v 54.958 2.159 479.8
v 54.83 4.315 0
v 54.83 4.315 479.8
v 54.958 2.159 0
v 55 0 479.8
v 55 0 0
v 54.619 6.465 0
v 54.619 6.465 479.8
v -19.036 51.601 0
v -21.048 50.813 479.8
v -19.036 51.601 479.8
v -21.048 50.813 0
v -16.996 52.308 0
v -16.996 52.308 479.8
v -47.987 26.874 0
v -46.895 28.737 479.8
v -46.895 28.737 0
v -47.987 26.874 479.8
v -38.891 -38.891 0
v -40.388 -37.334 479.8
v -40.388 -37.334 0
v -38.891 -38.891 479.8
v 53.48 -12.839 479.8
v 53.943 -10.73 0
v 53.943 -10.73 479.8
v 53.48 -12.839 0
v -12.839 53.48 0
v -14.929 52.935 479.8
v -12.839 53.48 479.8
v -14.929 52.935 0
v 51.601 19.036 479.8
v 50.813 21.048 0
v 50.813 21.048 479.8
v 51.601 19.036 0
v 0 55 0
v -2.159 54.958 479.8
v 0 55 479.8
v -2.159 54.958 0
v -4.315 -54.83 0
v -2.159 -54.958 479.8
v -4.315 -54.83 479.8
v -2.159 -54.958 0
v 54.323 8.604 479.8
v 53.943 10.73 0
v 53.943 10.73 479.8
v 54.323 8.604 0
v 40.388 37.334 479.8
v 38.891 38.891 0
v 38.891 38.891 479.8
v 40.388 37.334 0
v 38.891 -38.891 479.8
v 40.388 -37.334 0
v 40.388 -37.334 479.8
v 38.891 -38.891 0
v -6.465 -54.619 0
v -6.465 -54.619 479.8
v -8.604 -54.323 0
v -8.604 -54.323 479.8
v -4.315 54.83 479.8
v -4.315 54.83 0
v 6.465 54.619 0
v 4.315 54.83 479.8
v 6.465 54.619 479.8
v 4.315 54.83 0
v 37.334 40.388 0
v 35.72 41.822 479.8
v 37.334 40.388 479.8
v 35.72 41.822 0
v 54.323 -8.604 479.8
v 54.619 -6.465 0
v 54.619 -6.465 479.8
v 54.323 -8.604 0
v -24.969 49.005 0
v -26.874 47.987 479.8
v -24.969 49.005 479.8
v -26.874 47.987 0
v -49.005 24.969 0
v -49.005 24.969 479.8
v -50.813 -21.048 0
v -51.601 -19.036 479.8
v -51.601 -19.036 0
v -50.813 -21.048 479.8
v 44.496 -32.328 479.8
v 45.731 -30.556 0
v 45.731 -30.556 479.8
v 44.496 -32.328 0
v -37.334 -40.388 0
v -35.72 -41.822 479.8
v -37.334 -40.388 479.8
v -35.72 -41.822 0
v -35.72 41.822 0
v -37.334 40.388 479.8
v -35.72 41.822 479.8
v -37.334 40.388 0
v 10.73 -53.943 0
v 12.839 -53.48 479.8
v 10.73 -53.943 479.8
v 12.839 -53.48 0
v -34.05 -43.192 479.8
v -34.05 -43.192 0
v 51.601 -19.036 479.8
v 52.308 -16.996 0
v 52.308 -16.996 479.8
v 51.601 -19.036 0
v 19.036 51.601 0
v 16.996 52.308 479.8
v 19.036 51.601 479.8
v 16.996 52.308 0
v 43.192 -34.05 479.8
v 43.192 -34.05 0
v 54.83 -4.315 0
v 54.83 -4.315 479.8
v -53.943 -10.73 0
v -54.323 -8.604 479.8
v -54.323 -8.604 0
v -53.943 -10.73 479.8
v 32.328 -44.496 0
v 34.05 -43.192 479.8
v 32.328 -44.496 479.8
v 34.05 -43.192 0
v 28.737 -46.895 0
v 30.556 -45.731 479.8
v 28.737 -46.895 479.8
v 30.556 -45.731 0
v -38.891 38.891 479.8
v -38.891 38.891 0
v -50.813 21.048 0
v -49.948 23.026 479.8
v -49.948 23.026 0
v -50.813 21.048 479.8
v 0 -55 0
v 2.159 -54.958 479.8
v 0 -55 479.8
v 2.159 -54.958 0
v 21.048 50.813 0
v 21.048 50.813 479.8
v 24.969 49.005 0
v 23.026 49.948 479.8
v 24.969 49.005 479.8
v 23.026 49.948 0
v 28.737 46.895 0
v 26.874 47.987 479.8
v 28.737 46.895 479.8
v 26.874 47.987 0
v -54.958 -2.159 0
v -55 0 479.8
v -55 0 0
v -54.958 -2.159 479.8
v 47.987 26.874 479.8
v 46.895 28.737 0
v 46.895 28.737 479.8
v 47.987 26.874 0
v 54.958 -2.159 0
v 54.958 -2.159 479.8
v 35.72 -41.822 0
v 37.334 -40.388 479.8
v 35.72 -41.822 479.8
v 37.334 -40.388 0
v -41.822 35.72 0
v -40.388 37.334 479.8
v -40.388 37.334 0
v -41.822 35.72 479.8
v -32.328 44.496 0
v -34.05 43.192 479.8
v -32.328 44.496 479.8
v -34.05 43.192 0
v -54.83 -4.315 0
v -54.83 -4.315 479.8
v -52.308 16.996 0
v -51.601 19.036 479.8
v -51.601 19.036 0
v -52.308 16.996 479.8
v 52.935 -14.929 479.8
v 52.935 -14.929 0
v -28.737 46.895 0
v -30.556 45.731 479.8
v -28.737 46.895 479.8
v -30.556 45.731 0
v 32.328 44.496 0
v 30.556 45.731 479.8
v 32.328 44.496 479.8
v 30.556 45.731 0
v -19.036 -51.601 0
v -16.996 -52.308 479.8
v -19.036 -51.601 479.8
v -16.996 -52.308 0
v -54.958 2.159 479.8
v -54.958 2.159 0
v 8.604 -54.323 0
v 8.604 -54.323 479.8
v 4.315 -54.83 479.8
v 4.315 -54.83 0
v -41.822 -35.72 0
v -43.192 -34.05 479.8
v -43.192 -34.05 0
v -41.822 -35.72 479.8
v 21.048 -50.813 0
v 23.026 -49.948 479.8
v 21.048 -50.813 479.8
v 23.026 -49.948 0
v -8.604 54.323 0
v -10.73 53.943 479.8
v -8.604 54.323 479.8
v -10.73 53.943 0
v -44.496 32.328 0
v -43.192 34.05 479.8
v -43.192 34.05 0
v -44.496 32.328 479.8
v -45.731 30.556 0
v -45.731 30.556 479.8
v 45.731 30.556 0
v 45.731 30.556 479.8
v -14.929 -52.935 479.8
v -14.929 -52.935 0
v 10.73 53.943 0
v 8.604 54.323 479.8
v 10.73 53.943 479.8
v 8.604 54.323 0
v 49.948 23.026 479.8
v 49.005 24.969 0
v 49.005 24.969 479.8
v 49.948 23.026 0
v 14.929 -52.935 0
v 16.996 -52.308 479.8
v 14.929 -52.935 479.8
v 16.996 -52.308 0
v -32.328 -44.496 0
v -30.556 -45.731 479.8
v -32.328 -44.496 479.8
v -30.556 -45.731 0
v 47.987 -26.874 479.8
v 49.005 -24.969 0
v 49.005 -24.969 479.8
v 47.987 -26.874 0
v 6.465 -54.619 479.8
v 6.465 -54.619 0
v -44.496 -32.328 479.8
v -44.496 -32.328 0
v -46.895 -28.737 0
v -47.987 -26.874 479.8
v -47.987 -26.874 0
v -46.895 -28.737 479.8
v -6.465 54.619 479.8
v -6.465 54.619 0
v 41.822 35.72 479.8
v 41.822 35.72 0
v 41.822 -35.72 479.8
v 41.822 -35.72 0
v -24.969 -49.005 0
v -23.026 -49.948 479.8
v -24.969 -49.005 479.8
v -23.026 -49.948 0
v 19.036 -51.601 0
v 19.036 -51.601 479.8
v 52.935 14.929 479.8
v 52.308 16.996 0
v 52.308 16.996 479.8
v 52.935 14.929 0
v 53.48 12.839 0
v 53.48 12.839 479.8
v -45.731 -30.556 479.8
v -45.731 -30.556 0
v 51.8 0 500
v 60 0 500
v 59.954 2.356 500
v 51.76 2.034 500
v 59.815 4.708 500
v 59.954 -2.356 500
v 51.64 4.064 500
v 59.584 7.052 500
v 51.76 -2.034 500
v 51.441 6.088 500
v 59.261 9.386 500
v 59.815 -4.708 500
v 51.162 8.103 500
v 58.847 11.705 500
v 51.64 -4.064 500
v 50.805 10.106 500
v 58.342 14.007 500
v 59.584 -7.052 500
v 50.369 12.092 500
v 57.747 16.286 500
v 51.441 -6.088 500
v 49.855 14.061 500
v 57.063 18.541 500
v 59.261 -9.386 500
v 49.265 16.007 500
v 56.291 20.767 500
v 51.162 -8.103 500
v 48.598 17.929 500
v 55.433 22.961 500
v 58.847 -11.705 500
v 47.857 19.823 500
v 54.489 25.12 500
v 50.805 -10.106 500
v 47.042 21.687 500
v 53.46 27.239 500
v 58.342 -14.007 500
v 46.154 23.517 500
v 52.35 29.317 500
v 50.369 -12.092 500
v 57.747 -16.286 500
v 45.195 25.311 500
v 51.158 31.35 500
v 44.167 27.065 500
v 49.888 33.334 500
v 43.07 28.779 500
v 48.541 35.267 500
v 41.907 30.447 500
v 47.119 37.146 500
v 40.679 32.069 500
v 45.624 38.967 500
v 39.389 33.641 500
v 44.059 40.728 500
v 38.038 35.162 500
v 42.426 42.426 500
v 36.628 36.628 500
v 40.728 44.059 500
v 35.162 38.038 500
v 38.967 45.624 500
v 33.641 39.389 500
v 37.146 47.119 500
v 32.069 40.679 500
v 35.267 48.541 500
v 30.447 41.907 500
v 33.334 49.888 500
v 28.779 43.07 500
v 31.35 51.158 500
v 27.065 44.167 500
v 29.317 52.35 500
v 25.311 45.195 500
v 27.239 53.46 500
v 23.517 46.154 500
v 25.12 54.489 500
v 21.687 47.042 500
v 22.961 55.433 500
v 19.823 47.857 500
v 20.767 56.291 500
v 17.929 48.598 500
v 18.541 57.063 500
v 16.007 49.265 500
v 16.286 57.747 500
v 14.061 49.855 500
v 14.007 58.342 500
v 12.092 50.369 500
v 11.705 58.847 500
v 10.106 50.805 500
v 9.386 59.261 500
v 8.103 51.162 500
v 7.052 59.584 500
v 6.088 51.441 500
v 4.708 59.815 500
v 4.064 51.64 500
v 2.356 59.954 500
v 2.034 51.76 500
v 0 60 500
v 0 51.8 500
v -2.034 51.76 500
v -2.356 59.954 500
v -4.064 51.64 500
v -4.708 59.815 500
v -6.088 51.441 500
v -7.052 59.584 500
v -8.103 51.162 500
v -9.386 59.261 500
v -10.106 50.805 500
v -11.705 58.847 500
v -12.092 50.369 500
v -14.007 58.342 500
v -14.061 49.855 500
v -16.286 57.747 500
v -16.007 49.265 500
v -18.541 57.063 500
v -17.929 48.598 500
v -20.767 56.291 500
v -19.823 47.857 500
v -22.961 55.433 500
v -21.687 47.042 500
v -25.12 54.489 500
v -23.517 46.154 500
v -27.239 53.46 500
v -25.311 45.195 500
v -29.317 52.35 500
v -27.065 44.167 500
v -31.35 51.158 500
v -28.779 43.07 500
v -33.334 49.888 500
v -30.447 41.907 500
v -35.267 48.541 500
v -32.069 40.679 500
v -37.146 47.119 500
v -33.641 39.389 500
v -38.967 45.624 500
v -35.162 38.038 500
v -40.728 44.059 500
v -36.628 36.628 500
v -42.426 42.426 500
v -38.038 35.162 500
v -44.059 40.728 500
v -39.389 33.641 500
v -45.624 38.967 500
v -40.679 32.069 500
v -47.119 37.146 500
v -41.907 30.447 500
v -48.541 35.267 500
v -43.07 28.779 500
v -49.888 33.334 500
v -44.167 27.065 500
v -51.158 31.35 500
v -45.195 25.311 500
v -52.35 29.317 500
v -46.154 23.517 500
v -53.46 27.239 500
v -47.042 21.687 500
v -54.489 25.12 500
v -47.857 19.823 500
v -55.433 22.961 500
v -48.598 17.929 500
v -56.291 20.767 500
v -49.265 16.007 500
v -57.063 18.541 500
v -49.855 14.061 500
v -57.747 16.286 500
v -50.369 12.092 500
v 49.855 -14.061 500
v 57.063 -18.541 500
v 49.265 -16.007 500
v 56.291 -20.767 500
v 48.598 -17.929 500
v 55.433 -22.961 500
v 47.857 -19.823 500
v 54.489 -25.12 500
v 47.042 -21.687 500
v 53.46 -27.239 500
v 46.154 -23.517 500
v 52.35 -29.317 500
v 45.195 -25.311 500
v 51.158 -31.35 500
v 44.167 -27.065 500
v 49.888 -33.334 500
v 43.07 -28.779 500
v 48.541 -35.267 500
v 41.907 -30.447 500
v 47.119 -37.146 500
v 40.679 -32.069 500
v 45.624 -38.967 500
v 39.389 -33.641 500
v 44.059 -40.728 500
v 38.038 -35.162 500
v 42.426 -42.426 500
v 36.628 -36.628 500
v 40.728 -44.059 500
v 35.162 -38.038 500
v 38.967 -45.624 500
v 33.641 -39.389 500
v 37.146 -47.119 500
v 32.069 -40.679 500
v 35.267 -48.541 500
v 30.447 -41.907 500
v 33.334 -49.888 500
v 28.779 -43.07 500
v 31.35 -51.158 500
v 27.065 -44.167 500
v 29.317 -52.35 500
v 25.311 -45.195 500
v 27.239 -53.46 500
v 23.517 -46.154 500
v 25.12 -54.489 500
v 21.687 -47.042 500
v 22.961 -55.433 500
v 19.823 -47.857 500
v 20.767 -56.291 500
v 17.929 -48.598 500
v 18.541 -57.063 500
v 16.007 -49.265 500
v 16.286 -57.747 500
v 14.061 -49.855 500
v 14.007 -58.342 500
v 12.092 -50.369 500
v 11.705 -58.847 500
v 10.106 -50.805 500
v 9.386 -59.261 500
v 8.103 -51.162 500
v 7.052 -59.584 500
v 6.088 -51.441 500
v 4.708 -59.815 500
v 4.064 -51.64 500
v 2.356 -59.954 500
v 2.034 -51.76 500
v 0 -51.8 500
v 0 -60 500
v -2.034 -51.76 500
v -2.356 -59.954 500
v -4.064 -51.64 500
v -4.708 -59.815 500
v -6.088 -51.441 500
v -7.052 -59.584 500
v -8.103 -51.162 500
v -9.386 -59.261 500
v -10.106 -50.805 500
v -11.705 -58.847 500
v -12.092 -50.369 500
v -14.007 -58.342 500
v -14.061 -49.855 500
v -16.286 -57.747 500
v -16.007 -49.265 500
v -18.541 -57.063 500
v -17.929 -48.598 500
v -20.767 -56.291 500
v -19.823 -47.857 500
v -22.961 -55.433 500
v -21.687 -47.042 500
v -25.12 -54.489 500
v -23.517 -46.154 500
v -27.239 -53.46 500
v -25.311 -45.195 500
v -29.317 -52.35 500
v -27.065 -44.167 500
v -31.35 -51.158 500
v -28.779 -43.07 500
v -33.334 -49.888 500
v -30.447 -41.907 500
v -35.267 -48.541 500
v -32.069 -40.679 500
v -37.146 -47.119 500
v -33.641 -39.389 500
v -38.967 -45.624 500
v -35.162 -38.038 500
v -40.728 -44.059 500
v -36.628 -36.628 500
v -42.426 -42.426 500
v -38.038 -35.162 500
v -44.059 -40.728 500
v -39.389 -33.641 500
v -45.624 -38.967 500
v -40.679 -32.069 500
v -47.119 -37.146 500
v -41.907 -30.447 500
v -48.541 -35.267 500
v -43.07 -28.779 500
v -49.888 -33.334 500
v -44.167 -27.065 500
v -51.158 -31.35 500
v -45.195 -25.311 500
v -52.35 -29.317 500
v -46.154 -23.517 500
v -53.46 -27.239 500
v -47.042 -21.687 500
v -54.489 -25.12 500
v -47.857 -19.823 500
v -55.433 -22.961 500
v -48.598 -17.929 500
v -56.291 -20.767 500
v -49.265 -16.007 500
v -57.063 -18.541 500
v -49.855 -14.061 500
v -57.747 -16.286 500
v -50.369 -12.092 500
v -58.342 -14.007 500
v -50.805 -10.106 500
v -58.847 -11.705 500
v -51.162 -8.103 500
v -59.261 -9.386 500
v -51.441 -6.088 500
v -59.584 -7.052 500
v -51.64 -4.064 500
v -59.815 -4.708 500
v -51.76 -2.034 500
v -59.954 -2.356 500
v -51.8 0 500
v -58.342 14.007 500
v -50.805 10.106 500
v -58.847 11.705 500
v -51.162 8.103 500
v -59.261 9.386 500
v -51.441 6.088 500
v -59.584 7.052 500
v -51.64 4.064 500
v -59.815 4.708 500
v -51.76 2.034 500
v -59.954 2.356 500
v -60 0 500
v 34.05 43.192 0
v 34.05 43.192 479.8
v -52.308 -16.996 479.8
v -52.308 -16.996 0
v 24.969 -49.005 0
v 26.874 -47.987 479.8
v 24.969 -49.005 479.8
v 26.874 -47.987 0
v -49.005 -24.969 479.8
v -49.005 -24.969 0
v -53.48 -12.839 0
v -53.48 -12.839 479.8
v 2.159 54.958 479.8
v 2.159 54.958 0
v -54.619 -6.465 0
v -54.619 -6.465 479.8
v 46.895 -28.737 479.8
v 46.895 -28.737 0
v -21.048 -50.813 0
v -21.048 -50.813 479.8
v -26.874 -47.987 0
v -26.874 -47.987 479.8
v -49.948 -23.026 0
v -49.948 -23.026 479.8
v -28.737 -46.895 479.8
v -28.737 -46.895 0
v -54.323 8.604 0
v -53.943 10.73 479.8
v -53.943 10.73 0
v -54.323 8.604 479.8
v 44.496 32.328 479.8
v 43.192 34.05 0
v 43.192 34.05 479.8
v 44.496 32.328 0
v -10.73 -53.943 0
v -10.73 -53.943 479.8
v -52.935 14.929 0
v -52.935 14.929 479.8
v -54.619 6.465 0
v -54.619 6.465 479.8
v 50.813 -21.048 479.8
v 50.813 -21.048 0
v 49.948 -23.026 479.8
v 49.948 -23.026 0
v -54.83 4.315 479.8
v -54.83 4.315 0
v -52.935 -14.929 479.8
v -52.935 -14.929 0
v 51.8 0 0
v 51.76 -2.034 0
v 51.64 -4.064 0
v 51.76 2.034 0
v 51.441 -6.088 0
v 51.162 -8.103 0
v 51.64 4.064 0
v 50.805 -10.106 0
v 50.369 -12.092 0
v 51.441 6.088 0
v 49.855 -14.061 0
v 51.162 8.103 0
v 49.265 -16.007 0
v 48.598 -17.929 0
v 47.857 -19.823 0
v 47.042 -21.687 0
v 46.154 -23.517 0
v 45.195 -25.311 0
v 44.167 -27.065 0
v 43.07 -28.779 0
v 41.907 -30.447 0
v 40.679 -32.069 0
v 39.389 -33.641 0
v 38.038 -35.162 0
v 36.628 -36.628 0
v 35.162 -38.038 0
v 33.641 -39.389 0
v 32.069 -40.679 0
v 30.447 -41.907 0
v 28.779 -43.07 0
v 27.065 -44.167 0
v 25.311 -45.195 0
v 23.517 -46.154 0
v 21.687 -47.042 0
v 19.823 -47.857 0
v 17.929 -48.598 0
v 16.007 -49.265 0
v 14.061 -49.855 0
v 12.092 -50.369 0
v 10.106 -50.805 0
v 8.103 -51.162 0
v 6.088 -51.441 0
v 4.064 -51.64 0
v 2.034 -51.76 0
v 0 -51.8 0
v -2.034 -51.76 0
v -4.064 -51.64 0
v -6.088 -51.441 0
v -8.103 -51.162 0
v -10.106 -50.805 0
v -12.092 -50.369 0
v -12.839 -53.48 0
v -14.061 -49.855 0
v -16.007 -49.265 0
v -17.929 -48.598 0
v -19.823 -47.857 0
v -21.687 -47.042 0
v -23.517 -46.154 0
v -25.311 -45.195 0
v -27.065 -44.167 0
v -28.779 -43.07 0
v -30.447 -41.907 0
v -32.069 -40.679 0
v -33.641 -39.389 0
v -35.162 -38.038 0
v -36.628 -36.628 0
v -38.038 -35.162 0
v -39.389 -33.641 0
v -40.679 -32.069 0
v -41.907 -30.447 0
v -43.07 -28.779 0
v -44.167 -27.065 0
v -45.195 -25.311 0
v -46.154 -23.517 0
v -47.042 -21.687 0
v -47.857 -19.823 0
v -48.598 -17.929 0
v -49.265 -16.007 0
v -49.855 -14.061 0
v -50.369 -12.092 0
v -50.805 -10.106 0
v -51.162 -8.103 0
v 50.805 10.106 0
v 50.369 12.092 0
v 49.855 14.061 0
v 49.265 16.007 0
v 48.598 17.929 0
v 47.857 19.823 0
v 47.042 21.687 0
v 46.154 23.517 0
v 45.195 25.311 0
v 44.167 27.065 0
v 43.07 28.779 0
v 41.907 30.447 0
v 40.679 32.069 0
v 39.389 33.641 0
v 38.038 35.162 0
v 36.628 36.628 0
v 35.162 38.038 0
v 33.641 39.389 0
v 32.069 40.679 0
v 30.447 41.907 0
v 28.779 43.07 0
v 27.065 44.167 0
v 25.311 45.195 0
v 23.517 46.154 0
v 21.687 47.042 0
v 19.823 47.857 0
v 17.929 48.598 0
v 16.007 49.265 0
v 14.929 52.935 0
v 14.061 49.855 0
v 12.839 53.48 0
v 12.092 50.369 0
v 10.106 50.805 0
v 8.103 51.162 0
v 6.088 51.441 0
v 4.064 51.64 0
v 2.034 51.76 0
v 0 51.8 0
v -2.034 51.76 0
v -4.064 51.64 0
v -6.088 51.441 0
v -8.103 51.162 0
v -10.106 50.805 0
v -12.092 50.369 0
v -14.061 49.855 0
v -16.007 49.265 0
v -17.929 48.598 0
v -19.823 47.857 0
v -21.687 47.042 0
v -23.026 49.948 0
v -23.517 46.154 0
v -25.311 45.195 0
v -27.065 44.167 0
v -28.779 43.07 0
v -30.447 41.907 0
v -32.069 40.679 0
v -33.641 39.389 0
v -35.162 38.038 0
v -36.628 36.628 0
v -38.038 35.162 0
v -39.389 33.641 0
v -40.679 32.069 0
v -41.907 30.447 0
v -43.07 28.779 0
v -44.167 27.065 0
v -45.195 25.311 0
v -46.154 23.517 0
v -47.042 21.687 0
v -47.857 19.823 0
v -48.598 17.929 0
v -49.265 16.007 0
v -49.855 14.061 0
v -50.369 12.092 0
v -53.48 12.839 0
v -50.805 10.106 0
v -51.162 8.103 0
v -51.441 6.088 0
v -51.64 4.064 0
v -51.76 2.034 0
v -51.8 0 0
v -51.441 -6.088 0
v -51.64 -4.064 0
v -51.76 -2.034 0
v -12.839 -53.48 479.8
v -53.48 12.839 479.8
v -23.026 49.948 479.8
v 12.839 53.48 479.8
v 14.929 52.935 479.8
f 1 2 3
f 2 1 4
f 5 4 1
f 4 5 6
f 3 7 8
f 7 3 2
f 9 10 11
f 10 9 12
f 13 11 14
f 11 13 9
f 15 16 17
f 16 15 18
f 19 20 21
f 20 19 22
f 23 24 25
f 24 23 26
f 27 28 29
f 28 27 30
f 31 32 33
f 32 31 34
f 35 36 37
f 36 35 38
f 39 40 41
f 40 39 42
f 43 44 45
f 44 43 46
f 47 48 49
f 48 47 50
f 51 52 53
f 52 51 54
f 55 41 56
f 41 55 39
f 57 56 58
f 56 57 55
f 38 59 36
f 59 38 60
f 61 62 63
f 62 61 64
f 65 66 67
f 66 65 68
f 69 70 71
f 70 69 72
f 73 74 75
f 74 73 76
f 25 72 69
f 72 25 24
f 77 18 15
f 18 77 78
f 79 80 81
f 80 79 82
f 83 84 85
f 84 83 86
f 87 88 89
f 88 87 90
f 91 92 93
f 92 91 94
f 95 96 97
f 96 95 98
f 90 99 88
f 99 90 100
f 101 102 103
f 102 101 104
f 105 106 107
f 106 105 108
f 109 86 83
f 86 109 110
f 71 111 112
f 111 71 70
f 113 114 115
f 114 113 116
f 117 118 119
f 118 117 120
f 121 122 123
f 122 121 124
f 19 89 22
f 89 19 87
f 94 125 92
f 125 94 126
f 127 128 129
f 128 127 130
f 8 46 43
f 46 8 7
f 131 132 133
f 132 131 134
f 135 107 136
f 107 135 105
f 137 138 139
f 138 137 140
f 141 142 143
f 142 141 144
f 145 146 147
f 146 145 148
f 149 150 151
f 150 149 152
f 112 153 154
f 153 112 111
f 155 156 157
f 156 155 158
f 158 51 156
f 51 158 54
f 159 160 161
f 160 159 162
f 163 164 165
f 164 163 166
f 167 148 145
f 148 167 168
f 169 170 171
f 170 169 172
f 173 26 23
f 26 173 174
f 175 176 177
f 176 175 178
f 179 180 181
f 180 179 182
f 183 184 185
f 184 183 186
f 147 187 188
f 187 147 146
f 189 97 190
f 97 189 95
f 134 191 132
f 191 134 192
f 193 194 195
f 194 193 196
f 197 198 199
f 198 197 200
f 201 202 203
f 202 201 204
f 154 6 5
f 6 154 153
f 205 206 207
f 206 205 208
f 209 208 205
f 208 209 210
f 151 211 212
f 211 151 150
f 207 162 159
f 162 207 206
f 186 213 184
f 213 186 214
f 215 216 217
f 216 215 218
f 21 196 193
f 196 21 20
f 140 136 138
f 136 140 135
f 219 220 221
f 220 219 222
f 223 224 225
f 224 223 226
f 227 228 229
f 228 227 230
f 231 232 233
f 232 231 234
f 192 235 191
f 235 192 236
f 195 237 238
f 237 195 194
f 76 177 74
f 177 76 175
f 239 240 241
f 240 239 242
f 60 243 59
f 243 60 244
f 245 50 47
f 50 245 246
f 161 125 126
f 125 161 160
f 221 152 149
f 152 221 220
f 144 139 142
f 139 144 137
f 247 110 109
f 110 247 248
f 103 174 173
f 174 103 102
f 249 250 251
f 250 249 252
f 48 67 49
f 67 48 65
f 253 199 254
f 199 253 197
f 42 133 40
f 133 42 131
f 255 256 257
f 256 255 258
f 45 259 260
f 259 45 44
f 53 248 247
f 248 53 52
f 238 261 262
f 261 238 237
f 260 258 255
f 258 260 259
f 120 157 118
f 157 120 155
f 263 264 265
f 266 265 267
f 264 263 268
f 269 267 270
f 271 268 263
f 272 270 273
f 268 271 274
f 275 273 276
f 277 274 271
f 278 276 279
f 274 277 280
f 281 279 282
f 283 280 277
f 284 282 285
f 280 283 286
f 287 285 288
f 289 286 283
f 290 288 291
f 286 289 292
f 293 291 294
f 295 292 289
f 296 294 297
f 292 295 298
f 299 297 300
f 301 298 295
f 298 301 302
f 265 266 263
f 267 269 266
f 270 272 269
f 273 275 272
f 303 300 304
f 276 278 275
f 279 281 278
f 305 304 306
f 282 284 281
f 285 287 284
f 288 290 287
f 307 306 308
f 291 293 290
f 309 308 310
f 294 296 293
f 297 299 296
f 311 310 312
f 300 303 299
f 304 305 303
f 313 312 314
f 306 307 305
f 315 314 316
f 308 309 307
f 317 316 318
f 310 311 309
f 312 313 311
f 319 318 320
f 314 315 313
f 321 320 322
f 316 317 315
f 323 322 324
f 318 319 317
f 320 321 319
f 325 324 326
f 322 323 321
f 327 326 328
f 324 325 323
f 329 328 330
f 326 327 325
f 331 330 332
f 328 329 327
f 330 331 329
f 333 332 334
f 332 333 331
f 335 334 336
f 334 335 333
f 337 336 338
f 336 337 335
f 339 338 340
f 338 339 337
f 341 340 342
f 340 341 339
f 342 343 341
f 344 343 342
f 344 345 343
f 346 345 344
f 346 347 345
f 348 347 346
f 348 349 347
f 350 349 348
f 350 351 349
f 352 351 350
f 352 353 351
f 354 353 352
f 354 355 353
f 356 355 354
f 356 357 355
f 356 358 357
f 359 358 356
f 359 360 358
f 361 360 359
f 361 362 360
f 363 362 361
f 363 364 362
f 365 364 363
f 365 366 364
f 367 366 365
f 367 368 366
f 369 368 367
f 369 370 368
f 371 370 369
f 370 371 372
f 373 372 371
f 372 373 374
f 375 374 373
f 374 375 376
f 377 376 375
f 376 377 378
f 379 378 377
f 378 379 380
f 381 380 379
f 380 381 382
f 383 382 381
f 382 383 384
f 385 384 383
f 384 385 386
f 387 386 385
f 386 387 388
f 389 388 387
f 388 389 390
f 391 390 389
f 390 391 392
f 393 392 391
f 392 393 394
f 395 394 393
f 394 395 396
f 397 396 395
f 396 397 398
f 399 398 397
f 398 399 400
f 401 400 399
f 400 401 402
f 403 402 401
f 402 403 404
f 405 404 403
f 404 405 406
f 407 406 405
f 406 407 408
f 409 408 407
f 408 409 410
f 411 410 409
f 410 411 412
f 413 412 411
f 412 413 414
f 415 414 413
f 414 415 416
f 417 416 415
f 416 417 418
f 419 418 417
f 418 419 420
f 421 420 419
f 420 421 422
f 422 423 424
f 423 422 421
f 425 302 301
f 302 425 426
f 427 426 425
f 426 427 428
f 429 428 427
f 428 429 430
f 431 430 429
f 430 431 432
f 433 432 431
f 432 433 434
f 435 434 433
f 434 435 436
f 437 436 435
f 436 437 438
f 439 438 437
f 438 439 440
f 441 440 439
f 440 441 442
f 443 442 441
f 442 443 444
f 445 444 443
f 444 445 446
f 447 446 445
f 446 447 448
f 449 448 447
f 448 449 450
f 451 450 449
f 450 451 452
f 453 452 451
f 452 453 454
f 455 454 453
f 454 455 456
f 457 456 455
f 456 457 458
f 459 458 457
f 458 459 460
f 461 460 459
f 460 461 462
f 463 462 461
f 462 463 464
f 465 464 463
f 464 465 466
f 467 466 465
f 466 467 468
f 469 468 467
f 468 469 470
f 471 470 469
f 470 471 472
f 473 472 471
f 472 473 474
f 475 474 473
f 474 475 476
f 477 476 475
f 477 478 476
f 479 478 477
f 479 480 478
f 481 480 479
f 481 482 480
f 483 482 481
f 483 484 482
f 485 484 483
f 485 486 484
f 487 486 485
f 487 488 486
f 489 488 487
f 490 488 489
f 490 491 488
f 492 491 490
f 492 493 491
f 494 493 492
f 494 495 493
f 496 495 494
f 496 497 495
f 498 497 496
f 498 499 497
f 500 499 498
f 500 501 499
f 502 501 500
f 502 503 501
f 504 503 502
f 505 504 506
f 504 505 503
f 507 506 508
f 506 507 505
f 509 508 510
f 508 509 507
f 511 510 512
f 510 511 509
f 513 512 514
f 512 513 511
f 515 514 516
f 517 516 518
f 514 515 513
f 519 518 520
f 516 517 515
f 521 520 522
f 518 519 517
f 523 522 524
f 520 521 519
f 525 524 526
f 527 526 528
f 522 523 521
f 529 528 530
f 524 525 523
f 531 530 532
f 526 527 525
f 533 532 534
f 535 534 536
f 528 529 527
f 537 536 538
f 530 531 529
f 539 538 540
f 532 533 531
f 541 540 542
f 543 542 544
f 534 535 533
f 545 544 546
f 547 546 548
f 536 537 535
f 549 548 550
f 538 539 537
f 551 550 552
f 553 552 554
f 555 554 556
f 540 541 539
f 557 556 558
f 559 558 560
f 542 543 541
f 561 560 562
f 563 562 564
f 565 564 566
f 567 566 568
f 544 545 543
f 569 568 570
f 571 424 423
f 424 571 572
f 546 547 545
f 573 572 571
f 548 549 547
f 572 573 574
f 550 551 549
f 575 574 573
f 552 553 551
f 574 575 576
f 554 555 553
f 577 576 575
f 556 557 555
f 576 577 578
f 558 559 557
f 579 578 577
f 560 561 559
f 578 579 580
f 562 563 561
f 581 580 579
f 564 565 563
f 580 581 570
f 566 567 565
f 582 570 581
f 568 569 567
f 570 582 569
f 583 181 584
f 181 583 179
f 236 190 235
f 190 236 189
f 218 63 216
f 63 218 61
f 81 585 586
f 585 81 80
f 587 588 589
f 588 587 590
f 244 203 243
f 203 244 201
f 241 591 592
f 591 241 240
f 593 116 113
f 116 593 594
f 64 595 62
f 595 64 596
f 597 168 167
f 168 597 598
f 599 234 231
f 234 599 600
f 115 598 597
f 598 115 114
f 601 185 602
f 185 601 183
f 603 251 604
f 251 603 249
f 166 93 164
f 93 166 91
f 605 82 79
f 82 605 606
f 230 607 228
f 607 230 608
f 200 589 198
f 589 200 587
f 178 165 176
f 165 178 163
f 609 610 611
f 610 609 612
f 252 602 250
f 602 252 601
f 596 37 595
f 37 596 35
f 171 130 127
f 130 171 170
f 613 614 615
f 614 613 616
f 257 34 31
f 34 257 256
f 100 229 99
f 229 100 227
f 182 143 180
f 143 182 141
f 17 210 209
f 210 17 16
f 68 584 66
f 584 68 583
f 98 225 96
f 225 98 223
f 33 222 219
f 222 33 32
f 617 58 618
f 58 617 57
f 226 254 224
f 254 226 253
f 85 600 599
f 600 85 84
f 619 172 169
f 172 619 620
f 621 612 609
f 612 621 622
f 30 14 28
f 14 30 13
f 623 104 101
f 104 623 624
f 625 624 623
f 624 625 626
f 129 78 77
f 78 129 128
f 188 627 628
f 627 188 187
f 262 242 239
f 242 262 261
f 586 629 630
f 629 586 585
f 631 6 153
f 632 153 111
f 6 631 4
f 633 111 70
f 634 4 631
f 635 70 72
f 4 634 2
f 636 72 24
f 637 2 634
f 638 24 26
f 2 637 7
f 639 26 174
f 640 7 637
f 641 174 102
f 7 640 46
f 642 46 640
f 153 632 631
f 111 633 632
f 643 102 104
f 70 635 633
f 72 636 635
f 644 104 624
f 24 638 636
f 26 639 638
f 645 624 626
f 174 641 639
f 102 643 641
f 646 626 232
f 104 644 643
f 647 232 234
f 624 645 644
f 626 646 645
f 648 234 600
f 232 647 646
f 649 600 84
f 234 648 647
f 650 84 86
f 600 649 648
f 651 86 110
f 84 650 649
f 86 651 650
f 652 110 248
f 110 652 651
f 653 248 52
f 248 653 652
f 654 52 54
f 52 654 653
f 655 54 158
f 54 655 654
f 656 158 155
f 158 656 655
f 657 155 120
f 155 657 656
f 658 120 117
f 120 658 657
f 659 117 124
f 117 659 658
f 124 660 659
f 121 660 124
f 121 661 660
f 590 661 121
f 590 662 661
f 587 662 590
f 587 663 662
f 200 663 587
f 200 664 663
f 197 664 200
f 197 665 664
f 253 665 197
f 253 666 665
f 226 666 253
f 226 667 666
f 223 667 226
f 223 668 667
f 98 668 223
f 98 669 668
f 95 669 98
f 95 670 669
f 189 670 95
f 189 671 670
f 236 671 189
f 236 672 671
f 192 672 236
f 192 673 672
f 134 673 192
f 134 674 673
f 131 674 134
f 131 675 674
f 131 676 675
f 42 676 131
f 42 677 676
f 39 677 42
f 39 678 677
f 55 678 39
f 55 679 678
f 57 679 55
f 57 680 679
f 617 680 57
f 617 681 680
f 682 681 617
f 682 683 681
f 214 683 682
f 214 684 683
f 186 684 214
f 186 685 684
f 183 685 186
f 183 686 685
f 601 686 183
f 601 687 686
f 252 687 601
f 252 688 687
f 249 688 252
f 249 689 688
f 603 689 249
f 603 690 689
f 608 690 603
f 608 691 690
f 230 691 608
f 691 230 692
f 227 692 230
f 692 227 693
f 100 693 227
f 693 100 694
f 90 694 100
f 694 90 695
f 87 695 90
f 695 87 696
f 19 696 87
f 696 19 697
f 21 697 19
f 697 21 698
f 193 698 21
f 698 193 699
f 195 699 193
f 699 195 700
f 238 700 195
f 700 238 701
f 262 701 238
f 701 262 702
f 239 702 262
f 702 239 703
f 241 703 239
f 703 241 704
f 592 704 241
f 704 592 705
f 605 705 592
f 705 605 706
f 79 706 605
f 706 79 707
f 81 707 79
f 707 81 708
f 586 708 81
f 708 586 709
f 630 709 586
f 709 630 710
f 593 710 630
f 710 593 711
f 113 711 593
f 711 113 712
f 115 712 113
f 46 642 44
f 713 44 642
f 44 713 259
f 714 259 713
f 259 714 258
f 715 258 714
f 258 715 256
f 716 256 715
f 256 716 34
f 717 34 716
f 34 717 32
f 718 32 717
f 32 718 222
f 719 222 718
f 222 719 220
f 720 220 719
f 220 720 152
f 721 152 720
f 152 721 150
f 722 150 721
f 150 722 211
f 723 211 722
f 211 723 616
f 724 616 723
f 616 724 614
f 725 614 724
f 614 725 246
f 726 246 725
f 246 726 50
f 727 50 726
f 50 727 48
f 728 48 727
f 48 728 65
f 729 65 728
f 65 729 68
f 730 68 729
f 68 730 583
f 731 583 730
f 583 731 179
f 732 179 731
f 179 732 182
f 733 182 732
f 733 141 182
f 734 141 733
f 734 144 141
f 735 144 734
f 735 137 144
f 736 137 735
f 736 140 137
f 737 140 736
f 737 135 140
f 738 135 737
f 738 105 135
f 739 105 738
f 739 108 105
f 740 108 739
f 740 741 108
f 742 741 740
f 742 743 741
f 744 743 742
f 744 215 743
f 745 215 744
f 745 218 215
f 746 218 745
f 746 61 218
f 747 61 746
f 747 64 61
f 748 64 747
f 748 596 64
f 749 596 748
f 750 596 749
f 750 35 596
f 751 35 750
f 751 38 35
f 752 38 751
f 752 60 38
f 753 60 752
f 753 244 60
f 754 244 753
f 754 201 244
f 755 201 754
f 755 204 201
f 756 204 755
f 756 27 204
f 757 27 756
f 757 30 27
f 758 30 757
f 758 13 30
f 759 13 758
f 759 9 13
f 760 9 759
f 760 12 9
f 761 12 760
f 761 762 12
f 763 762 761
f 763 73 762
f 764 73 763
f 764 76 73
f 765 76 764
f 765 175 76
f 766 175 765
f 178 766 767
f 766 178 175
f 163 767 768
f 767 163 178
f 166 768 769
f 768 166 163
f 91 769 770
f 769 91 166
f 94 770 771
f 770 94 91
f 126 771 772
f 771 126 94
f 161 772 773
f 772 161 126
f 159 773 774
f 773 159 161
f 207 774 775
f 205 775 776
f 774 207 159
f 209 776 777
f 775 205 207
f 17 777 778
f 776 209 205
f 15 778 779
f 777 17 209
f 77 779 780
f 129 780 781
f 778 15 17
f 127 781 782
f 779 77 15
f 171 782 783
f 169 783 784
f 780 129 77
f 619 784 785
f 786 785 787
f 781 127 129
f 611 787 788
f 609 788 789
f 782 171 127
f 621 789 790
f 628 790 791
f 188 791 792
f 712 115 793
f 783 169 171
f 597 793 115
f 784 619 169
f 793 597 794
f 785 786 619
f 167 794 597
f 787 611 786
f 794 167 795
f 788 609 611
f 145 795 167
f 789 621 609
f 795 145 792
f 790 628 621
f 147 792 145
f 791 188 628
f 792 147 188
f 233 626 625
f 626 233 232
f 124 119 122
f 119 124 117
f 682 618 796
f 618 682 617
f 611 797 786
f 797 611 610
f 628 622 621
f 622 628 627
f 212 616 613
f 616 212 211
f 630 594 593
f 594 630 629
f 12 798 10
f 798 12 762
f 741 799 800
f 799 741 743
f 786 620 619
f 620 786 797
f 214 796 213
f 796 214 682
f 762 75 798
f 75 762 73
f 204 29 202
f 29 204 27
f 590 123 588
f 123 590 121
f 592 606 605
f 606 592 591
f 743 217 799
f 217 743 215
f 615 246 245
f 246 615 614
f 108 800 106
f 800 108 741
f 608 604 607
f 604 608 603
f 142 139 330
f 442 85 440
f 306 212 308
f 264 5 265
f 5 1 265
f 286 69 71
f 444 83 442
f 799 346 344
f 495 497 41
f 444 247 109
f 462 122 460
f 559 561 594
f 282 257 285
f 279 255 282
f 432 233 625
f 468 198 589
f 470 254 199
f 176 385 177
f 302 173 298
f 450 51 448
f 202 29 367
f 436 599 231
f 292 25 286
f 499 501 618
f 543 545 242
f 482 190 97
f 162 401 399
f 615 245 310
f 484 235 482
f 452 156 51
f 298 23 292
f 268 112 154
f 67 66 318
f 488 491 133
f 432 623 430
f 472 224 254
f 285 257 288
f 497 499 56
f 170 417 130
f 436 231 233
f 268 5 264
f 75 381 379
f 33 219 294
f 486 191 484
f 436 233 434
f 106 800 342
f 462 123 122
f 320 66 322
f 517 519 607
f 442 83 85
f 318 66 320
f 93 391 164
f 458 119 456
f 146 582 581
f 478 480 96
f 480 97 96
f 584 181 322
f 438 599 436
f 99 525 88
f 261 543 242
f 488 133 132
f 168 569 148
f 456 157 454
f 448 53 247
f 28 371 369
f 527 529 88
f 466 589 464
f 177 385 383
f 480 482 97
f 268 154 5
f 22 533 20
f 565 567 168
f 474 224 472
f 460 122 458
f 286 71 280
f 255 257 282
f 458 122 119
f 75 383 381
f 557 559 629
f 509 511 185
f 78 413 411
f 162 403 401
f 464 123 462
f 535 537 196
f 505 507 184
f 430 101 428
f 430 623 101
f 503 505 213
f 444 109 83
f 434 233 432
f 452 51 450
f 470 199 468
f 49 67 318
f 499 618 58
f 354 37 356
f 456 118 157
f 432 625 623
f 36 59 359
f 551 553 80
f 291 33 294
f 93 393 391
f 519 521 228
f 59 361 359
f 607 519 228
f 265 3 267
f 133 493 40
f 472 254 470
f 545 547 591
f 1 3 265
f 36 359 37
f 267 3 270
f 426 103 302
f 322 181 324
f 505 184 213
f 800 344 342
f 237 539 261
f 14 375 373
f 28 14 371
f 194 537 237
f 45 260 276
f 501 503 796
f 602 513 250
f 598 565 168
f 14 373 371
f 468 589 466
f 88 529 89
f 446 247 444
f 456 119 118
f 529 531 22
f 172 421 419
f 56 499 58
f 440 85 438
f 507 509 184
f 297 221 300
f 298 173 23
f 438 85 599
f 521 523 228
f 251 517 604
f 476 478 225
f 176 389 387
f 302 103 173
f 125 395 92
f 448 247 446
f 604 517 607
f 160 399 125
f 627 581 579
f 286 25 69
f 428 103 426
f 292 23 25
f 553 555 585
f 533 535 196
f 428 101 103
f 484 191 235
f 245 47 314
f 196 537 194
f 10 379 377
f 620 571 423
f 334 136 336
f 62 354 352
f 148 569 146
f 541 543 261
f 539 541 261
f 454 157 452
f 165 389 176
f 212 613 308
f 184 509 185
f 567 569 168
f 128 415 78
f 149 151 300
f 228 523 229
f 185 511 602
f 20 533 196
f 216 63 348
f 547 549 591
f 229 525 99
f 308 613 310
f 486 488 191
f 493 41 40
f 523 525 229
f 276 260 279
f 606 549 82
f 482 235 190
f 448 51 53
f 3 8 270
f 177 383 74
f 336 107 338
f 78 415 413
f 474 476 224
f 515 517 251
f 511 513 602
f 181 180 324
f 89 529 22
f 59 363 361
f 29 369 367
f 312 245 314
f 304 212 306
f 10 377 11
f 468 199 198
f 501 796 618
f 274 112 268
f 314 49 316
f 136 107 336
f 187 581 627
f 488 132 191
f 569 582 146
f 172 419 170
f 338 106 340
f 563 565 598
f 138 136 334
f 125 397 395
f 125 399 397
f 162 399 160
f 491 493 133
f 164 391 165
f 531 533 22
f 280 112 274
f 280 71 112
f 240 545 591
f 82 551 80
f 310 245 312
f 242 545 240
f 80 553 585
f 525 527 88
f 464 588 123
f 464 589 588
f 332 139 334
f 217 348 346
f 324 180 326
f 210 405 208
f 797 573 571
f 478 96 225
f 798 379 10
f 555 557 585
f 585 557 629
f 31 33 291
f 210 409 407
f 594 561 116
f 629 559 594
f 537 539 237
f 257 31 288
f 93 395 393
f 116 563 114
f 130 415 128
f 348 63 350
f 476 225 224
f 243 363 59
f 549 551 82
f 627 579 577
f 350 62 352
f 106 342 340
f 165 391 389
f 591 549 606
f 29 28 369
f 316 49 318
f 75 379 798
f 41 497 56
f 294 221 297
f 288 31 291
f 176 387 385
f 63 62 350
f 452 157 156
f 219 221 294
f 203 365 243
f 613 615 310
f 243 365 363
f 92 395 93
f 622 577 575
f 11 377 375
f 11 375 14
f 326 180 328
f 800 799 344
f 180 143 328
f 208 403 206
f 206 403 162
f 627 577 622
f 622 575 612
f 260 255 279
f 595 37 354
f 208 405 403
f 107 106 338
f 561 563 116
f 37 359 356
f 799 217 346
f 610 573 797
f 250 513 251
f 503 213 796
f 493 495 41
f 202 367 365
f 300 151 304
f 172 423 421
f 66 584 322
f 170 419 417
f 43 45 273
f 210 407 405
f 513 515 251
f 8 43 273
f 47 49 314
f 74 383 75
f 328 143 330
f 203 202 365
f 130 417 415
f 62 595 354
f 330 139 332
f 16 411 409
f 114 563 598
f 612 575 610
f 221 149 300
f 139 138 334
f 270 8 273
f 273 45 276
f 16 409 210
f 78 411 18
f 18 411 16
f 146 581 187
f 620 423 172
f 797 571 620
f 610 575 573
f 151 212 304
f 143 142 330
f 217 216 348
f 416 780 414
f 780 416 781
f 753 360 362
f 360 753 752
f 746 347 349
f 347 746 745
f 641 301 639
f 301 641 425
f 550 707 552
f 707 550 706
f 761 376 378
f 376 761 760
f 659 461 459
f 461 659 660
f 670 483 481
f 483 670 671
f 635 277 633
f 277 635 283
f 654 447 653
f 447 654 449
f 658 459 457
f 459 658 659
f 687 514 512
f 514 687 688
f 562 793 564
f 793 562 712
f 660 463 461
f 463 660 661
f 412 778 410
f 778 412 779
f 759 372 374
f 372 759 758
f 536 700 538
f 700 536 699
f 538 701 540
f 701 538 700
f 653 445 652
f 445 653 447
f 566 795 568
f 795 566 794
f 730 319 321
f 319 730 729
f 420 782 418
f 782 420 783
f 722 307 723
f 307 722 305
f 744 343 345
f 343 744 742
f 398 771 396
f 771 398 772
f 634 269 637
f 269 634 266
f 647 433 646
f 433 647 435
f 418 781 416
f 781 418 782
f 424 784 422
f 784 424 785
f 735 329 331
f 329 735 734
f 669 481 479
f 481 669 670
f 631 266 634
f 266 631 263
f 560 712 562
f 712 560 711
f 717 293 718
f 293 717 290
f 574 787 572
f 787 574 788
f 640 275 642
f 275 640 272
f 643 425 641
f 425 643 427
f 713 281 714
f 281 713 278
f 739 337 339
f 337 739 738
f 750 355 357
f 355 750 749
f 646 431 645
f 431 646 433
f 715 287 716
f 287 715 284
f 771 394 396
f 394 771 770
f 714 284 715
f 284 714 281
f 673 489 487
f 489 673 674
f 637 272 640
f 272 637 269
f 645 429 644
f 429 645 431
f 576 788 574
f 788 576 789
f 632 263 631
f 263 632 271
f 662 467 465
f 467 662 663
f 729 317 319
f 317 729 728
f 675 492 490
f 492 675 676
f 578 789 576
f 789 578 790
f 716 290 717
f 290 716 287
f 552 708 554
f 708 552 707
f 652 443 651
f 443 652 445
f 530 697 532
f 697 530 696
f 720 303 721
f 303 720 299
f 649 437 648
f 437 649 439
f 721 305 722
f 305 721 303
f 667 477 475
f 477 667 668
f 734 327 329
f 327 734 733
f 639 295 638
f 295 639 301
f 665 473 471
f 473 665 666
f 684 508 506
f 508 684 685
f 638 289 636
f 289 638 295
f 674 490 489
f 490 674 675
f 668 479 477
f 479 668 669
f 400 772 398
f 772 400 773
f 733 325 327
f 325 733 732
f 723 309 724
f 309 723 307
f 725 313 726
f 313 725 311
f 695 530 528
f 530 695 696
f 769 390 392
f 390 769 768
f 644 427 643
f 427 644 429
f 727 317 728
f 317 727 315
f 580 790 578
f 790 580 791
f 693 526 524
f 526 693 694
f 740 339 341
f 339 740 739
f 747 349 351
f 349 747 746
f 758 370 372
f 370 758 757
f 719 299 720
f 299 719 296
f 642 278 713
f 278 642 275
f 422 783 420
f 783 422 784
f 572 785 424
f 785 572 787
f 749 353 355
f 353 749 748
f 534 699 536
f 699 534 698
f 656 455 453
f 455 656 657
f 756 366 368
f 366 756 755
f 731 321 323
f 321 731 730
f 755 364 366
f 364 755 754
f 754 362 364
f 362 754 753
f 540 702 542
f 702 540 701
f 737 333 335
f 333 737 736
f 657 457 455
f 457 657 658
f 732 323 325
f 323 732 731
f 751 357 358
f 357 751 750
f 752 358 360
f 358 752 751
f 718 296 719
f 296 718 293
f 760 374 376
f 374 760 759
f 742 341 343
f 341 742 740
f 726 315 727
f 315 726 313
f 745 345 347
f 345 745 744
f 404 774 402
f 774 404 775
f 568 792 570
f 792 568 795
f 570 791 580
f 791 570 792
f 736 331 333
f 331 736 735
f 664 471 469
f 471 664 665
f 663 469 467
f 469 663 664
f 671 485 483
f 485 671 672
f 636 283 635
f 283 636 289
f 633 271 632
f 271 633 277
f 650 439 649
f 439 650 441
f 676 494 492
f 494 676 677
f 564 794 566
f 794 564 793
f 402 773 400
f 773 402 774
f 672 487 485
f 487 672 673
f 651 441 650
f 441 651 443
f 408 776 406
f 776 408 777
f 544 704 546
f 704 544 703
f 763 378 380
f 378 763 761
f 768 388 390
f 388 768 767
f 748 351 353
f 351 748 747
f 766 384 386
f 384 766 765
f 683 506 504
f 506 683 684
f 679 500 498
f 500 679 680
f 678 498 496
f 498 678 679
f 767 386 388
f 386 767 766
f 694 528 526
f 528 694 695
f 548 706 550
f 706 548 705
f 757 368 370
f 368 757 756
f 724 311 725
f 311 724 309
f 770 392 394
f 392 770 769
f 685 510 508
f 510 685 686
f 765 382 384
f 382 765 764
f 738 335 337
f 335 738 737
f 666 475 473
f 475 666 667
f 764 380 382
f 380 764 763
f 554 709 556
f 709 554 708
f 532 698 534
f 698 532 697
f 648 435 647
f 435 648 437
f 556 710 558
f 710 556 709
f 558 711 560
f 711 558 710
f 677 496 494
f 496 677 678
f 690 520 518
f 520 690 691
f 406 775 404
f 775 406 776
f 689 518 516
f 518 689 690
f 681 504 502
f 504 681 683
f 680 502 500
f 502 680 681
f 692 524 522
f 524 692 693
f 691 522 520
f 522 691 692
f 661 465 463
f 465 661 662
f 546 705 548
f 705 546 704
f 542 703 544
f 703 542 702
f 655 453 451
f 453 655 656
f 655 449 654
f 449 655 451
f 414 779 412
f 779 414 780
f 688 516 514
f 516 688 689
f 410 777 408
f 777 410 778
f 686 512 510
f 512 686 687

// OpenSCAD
// HT 90 Pipe 500 mm (connected, hollow, with one end socket)
// Units: mm

$fn = 160;

outer_diameter = 110;      // OD
wall_thickness = 3.2;      // wall
length = 500;              // overall length
socket_length = 20;        // socket (end fitting) length
socket_expand = 10;        // OD increase at socket end (tapered)

eps = 0.2;

inner_diameter = outer_diameter - 2 * wall_thickness;

module ht_pipe() {
    difference() {
        // Outer shell: one connected solid (main + socket), with overlap
        union() {
            cylinder(h = length, d = outer_diameter, center = false);

            translate([0, 0, length - socket_length - eps])
                cylinder(h = socket_length + eps,
                         d1 = outer_diameter,
                         d2 = outer_diameter + socket_expand,
                         center = false);
        }

        // Inner bore: single subtraction through full length (covers socket too)
        translate([0, 0, -eps])
            cylinder(h = length + 2 * eps, d = inner_diameter, center = false);
    }
}

ht_pipe();
